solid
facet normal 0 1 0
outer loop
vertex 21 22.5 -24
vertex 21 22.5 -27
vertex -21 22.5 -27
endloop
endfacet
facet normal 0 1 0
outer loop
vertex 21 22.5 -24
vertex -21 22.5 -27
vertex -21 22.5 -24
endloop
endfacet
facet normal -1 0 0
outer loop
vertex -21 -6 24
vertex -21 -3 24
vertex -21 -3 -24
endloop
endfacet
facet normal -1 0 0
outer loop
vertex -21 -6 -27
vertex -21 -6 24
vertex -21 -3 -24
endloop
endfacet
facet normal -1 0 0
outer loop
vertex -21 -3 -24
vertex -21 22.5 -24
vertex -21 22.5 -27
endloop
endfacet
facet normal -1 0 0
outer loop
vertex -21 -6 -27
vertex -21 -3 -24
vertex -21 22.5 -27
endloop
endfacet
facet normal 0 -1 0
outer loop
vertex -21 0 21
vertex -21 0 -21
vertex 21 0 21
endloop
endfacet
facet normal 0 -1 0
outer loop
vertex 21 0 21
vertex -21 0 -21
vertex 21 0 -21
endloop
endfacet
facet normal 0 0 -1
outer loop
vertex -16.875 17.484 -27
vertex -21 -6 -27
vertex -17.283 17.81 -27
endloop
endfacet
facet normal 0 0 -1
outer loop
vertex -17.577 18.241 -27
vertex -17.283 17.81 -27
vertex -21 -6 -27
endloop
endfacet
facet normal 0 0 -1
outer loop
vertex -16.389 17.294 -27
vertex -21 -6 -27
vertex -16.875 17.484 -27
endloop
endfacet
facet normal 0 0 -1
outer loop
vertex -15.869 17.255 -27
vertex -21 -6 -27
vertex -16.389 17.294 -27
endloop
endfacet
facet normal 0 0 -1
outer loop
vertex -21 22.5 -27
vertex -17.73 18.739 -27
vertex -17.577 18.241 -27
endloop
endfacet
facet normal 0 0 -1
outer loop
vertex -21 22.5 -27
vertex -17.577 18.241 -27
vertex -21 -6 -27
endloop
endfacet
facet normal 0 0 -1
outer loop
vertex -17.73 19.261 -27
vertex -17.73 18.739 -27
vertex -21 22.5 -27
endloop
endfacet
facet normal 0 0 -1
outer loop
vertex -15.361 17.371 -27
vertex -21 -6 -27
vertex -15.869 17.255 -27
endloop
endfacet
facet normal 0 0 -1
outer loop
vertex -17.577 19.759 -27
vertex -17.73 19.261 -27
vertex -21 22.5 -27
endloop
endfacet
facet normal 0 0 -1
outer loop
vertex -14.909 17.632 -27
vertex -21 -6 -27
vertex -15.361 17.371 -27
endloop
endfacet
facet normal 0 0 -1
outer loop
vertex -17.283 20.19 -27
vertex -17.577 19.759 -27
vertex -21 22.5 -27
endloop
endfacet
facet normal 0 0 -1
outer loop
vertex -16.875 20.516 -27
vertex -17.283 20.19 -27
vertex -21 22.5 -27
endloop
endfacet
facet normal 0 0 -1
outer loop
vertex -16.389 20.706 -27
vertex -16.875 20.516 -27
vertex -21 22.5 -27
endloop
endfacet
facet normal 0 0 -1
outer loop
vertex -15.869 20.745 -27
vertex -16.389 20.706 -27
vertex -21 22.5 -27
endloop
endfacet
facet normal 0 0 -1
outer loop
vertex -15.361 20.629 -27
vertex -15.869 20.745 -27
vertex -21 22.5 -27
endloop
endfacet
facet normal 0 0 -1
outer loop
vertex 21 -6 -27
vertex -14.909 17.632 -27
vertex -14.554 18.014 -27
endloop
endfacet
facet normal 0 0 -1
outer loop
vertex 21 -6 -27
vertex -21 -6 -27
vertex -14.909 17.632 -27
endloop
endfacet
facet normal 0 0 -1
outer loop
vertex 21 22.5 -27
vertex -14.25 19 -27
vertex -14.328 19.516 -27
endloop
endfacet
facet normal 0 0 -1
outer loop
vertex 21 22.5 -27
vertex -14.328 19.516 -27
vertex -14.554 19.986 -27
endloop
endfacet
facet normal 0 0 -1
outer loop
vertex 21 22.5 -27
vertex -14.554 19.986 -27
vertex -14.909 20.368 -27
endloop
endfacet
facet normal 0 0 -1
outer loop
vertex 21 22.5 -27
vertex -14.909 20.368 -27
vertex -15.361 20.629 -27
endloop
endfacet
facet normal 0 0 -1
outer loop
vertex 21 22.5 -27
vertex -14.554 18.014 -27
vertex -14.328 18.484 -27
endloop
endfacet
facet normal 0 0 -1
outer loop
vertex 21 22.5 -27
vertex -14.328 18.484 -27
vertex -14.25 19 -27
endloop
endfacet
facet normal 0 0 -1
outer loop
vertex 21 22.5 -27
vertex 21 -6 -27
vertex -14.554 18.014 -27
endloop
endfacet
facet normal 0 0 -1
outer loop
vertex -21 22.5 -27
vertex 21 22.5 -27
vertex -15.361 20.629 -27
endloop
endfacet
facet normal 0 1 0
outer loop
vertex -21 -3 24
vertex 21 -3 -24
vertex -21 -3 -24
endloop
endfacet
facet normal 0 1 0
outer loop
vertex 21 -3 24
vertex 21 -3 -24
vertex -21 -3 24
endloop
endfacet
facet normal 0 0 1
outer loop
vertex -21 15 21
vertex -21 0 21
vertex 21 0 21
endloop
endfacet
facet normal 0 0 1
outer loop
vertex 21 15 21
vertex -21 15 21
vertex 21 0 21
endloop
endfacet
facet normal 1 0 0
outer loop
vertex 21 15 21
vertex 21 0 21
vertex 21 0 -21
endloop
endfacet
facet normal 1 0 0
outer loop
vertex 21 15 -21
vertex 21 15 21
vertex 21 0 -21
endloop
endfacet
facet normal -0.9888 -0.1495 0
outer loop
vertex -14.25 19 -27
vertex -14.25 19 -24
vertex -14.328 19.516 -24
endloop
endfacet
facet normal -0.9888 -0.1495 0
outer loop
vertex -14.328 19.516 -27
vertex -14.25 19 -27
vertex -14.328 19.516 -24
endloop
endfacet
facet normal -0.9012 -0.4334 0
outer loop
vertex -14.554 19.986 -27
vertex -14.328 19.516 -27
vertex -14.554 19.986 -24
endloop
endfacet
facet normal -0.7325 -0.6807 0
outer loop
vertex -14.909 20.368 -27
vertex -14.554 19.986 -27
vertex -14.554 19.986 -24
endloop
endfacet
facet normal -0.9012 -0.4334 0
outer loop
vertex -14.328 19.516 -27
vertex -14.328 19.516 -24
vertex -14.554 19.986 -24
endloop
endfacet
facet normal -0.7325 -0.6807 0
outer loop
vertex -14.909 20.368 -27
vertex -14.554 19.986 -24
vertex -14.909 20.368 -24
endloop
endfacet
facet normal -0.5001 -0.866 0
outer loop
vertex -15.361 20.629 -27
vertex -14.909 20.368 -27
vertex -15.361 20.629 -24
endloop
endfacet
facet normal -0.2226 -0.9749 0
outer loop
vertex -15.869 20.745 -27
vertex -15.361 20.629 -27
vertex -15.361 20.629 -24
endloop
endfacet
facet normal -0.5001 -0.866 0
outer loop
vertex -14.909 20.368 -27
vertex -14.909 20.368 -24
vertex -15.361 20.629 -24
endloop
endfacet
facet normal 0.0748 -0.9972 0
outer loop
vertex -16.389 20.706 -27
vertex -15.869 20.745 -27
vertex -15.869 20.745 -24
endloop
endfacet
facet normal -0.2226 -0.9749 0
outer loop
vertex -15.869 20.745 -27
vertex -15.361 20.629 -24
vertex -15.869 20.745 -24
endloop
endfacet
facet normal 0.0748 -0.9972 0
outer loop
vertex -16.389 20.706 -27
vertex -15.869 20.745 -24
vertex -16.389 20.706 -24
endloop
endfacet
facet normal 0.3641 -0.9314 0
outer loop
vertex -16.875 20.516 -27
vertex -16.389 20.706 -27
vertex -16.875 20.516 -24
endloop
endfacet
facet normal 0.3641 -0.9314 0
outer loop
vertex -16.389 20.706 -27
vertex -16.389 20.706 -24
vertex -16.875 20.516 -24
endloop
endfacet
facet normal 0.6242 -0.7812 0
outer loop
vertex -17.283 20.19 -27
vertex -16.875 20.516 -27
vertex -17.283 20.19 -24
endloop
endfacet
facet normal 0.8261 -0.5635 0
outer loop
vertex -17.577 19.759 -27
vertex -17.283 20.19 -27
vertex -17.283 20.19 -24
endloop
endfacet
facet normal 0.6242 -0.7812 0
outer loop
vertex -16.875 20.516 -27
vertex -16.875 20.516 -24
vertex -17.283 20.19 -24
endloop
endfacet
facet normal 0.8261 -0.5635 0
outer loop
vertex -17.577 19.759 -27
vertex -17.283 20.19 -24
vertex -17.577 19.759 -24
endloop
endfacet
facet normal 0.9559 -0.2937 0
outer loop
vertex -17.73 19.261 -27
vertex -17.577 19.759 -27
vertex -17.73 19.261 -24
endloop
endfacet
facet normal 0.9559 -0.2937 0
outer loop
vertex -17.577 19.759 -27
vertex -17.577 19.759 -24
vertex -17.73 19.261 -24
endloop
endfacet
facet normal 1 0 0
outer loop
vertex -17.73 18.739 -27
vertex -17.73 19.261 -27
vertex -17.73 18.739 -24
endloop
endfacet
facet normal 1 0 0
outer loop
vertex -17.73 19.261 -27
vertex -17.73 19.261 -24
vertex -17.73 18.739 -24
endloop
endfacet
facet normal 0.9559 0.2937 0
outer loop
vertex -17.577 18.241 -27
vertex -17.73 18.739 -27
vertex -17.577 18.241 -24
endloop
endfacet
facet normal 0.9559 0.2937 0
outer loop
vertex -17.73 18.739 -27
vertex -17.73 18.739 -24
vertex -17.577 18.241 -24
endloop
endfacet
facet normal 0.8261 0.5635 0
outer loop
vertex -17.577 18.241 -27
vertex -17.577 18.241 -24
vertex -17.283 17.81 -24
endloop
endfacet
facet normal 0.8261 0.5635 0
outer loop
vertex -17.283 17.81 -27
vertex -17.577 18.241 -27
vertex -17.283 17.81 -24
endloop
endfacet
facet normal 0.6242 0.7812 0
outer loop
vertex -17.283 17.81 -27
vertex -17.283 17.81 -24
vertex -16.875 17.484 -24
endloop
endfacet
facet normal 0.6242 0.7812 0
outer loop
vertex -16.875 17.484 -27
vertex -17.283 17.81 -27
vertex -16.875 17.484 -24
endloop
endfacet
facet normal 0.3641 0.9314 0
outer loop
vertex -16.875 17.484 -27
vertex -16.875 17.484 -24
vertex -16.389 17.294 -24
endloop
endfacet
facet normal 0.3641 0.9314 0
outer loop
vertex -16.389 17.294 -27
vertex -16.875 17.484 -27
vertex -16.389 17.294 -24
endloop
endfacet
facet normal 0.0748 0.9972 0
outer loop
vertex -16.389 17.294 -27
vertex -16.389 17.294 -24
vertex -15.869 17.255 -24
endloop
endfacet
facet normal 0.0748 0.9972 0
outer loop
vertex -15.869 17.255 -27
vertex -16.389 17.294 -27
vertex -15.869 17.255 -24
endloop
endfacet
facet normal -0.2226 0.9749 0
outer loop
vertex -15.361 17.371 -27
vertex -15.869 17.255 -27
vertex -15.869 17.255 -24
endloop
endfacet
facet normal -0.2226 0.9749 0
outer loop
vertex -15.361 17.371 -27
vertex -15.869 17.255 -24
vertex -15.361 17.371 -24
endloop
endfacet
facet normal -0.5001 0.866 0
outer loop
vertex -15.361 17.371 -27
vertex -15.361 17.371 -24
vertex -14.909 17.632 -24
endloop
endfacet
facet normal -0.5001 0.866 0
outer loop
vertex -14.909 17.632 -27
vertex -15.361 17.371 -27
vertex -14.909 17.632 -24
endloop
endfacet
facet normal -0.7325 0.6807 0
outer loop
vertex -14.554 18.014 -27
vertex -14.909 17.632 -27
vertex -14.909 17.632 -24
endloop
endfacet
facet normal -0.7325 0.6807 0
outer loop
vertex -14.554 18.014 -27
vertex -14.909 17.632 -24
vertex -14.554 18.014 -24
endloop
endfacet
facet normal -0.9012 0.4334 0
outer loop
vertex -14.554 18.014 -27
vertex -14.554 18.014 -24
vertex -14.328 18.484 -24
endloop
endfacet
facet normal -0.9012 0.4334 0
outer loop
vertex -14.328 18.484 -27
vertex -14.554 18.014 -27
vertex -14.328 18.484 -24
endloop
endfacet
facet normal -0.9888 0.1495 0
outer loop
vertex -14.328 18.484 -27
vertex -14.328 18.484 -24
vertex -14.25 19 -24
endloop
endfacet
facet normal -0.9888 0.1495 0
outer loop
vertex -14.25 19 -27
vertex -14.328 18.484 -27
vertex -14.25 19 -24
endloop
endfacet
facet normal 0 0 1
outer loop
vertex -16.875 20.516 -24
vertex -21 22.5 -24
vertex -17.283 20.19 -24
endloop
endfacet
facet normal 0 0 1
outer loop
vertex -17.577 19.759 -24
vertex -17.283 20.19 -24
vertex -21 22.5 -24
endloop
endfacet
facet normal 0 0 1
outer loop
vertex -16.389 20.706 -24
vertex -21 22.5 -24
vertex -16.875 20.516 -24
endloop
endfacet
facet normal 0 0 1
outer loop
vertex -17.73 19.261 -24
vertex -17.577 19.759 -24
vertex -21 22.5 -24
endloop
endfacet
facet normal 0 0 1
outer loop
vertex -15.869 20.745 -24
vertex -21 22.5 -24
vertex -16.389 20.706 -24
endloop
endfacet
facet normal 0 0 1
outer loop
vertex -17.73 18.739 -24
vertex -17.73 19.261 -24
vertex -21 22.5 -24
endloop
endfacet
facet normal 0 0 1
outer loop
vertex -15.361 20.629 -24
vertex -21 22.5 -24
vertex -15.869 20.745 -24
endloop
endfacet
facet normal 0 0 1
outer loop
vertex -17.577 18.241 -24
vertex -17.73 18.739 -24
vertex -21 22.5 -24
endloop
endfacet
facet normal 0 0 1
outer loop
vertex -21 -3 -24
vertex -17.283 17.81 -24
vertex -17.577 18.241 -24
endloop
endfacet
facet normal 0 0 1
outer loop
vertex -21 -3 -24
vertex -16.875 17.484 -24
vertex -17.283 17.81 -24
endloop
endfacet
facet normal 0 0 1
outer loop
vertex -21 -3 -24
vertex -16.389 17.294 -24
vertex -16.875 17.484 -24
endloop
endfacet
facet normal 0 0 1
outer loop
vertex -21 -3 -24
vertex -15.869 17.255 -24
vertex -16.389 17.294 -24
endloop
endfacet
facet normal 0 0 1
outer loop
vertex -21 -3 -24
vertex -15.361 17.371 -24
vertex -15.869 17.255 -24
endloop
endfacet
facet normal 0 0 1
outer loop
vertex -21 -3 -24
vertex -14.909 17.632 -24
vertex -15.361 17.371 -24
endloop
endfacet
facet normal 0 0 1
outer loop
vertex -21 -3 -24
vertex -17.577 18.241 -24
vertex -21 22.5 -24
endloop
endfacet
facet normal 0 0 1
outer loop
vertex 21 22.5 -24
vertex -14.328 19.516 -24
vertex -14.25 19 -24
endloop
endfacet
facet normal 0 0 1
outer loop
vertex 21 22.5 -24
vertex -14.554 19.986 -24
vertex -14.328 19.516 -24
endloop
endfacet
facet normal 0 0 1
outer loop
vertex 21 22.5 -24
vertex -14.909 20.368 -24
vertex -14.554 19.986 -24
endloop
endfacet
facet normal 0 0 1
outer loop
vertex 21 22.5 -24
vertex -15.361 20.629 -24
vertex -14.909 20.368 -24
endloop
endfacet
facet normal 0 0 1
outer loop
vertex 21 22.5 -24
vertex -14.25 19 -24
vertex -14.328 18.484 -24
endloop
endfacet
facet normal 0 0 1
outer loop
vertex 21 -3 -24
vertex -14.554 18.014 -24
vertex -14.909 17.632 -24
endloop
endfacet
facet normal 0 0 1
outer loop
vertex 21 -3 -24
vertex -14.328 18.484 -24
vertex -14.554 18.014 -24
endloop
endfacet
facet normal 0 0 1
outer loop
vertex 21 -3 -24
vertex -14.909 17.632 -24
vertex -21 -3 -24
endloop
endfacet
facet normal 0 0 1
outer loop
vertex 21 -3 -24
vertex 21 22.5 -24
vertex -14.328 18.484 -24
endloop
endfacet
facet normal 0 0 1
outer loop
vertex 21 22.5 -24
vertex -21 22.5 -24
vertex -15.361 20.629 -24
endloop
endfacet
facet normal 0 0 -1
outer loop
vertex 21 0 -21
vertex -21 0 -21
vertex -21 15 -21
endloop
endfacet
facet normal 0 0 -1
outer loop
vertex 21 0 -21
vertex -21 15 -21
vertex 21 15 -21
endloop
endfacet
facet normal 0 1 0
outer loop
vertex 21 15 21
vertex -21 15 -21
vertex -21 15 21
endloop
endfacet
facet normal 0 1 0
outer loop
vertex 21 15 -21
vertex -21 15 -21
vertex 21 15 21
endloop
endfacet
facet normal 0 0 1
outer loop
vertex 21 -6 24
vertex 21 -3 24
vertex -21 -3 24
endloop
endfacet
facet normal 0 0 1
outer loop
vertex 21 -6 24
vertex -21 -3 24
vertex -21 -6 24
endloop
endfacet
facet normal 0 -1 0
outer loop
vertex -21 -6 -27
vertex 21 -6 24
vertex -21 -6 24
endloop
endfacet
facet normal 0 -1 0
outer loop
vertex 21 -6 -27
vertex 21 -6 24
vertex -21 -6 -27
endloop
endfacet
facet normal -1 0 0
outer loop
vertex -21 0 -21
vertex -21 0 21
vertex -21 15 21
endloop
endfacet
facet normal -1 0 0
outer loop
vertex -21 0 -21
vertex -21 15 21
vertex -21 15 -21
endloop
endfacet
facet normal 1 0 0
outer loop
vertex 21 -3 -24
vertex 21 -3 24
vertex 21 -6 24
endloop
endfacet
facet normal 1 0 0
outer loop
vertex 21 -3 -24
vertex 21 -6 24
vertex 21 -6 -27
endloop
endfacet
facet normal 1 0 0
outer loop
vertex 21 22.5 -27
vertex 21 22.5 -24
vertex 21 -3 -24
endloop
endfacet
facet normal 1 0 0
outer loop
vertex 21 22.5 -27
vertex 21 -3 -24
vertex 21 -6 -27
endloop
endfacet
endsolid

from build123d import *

# Parameters (mm, degrees)
CROQUIS1_W              = 42
CROQUIS1_H              = 42
SALIENTE_EXTRUIR1_DEPTH = 15
SALIENTE_EXTRUIR2_DEPTH = 42
CROQUIS3_R              = 1.75
CORTAR_EXTRUIR1_DEPTH   = 58.019733426


with BuildPart() as part:
    # Croquis1 → Saliente-Extruir1 (new body)
    with BuildSketch(Plane(origin=(0, 0, 0), x_dir=(1, 0, 0), z_dir=(0, 1, 0))):
        Rectangle(CROQUIS1_W, CROQUIS1_H)
    extrude(amount=SALIENTE_EXTRUIR1_DEPTH)


with BuildPart() as body_2:
    # Croquis2 → Saliente-Extruir2 (new body)
    with BuildSketch(Plane(origin=(21, 0, 0), x_dir=(0, 0, -1), z_dir=(1, 0, 0))):
        Polygon((-24, -3), (-24, -6), (27, -6), (27, 22.5), (24, 22.5), (24, -3), align=None)
    extrude(amount=-SALIENTE_EXTRUIR2_DEPTH)

    # Croquis3 → Cortar-Extruir1 (cut, through all)
    with BuildSketch(Plane.XY.offset(-24)):
        with Locations((-16, 19)):
            Circle(CROQUIS3_R)
    extrude(amount=-CORTAR_EXTRUIR1_DEPTH, mode=Mode.SUBTRACT)


solid = Compound([part.part, body_2.part])
